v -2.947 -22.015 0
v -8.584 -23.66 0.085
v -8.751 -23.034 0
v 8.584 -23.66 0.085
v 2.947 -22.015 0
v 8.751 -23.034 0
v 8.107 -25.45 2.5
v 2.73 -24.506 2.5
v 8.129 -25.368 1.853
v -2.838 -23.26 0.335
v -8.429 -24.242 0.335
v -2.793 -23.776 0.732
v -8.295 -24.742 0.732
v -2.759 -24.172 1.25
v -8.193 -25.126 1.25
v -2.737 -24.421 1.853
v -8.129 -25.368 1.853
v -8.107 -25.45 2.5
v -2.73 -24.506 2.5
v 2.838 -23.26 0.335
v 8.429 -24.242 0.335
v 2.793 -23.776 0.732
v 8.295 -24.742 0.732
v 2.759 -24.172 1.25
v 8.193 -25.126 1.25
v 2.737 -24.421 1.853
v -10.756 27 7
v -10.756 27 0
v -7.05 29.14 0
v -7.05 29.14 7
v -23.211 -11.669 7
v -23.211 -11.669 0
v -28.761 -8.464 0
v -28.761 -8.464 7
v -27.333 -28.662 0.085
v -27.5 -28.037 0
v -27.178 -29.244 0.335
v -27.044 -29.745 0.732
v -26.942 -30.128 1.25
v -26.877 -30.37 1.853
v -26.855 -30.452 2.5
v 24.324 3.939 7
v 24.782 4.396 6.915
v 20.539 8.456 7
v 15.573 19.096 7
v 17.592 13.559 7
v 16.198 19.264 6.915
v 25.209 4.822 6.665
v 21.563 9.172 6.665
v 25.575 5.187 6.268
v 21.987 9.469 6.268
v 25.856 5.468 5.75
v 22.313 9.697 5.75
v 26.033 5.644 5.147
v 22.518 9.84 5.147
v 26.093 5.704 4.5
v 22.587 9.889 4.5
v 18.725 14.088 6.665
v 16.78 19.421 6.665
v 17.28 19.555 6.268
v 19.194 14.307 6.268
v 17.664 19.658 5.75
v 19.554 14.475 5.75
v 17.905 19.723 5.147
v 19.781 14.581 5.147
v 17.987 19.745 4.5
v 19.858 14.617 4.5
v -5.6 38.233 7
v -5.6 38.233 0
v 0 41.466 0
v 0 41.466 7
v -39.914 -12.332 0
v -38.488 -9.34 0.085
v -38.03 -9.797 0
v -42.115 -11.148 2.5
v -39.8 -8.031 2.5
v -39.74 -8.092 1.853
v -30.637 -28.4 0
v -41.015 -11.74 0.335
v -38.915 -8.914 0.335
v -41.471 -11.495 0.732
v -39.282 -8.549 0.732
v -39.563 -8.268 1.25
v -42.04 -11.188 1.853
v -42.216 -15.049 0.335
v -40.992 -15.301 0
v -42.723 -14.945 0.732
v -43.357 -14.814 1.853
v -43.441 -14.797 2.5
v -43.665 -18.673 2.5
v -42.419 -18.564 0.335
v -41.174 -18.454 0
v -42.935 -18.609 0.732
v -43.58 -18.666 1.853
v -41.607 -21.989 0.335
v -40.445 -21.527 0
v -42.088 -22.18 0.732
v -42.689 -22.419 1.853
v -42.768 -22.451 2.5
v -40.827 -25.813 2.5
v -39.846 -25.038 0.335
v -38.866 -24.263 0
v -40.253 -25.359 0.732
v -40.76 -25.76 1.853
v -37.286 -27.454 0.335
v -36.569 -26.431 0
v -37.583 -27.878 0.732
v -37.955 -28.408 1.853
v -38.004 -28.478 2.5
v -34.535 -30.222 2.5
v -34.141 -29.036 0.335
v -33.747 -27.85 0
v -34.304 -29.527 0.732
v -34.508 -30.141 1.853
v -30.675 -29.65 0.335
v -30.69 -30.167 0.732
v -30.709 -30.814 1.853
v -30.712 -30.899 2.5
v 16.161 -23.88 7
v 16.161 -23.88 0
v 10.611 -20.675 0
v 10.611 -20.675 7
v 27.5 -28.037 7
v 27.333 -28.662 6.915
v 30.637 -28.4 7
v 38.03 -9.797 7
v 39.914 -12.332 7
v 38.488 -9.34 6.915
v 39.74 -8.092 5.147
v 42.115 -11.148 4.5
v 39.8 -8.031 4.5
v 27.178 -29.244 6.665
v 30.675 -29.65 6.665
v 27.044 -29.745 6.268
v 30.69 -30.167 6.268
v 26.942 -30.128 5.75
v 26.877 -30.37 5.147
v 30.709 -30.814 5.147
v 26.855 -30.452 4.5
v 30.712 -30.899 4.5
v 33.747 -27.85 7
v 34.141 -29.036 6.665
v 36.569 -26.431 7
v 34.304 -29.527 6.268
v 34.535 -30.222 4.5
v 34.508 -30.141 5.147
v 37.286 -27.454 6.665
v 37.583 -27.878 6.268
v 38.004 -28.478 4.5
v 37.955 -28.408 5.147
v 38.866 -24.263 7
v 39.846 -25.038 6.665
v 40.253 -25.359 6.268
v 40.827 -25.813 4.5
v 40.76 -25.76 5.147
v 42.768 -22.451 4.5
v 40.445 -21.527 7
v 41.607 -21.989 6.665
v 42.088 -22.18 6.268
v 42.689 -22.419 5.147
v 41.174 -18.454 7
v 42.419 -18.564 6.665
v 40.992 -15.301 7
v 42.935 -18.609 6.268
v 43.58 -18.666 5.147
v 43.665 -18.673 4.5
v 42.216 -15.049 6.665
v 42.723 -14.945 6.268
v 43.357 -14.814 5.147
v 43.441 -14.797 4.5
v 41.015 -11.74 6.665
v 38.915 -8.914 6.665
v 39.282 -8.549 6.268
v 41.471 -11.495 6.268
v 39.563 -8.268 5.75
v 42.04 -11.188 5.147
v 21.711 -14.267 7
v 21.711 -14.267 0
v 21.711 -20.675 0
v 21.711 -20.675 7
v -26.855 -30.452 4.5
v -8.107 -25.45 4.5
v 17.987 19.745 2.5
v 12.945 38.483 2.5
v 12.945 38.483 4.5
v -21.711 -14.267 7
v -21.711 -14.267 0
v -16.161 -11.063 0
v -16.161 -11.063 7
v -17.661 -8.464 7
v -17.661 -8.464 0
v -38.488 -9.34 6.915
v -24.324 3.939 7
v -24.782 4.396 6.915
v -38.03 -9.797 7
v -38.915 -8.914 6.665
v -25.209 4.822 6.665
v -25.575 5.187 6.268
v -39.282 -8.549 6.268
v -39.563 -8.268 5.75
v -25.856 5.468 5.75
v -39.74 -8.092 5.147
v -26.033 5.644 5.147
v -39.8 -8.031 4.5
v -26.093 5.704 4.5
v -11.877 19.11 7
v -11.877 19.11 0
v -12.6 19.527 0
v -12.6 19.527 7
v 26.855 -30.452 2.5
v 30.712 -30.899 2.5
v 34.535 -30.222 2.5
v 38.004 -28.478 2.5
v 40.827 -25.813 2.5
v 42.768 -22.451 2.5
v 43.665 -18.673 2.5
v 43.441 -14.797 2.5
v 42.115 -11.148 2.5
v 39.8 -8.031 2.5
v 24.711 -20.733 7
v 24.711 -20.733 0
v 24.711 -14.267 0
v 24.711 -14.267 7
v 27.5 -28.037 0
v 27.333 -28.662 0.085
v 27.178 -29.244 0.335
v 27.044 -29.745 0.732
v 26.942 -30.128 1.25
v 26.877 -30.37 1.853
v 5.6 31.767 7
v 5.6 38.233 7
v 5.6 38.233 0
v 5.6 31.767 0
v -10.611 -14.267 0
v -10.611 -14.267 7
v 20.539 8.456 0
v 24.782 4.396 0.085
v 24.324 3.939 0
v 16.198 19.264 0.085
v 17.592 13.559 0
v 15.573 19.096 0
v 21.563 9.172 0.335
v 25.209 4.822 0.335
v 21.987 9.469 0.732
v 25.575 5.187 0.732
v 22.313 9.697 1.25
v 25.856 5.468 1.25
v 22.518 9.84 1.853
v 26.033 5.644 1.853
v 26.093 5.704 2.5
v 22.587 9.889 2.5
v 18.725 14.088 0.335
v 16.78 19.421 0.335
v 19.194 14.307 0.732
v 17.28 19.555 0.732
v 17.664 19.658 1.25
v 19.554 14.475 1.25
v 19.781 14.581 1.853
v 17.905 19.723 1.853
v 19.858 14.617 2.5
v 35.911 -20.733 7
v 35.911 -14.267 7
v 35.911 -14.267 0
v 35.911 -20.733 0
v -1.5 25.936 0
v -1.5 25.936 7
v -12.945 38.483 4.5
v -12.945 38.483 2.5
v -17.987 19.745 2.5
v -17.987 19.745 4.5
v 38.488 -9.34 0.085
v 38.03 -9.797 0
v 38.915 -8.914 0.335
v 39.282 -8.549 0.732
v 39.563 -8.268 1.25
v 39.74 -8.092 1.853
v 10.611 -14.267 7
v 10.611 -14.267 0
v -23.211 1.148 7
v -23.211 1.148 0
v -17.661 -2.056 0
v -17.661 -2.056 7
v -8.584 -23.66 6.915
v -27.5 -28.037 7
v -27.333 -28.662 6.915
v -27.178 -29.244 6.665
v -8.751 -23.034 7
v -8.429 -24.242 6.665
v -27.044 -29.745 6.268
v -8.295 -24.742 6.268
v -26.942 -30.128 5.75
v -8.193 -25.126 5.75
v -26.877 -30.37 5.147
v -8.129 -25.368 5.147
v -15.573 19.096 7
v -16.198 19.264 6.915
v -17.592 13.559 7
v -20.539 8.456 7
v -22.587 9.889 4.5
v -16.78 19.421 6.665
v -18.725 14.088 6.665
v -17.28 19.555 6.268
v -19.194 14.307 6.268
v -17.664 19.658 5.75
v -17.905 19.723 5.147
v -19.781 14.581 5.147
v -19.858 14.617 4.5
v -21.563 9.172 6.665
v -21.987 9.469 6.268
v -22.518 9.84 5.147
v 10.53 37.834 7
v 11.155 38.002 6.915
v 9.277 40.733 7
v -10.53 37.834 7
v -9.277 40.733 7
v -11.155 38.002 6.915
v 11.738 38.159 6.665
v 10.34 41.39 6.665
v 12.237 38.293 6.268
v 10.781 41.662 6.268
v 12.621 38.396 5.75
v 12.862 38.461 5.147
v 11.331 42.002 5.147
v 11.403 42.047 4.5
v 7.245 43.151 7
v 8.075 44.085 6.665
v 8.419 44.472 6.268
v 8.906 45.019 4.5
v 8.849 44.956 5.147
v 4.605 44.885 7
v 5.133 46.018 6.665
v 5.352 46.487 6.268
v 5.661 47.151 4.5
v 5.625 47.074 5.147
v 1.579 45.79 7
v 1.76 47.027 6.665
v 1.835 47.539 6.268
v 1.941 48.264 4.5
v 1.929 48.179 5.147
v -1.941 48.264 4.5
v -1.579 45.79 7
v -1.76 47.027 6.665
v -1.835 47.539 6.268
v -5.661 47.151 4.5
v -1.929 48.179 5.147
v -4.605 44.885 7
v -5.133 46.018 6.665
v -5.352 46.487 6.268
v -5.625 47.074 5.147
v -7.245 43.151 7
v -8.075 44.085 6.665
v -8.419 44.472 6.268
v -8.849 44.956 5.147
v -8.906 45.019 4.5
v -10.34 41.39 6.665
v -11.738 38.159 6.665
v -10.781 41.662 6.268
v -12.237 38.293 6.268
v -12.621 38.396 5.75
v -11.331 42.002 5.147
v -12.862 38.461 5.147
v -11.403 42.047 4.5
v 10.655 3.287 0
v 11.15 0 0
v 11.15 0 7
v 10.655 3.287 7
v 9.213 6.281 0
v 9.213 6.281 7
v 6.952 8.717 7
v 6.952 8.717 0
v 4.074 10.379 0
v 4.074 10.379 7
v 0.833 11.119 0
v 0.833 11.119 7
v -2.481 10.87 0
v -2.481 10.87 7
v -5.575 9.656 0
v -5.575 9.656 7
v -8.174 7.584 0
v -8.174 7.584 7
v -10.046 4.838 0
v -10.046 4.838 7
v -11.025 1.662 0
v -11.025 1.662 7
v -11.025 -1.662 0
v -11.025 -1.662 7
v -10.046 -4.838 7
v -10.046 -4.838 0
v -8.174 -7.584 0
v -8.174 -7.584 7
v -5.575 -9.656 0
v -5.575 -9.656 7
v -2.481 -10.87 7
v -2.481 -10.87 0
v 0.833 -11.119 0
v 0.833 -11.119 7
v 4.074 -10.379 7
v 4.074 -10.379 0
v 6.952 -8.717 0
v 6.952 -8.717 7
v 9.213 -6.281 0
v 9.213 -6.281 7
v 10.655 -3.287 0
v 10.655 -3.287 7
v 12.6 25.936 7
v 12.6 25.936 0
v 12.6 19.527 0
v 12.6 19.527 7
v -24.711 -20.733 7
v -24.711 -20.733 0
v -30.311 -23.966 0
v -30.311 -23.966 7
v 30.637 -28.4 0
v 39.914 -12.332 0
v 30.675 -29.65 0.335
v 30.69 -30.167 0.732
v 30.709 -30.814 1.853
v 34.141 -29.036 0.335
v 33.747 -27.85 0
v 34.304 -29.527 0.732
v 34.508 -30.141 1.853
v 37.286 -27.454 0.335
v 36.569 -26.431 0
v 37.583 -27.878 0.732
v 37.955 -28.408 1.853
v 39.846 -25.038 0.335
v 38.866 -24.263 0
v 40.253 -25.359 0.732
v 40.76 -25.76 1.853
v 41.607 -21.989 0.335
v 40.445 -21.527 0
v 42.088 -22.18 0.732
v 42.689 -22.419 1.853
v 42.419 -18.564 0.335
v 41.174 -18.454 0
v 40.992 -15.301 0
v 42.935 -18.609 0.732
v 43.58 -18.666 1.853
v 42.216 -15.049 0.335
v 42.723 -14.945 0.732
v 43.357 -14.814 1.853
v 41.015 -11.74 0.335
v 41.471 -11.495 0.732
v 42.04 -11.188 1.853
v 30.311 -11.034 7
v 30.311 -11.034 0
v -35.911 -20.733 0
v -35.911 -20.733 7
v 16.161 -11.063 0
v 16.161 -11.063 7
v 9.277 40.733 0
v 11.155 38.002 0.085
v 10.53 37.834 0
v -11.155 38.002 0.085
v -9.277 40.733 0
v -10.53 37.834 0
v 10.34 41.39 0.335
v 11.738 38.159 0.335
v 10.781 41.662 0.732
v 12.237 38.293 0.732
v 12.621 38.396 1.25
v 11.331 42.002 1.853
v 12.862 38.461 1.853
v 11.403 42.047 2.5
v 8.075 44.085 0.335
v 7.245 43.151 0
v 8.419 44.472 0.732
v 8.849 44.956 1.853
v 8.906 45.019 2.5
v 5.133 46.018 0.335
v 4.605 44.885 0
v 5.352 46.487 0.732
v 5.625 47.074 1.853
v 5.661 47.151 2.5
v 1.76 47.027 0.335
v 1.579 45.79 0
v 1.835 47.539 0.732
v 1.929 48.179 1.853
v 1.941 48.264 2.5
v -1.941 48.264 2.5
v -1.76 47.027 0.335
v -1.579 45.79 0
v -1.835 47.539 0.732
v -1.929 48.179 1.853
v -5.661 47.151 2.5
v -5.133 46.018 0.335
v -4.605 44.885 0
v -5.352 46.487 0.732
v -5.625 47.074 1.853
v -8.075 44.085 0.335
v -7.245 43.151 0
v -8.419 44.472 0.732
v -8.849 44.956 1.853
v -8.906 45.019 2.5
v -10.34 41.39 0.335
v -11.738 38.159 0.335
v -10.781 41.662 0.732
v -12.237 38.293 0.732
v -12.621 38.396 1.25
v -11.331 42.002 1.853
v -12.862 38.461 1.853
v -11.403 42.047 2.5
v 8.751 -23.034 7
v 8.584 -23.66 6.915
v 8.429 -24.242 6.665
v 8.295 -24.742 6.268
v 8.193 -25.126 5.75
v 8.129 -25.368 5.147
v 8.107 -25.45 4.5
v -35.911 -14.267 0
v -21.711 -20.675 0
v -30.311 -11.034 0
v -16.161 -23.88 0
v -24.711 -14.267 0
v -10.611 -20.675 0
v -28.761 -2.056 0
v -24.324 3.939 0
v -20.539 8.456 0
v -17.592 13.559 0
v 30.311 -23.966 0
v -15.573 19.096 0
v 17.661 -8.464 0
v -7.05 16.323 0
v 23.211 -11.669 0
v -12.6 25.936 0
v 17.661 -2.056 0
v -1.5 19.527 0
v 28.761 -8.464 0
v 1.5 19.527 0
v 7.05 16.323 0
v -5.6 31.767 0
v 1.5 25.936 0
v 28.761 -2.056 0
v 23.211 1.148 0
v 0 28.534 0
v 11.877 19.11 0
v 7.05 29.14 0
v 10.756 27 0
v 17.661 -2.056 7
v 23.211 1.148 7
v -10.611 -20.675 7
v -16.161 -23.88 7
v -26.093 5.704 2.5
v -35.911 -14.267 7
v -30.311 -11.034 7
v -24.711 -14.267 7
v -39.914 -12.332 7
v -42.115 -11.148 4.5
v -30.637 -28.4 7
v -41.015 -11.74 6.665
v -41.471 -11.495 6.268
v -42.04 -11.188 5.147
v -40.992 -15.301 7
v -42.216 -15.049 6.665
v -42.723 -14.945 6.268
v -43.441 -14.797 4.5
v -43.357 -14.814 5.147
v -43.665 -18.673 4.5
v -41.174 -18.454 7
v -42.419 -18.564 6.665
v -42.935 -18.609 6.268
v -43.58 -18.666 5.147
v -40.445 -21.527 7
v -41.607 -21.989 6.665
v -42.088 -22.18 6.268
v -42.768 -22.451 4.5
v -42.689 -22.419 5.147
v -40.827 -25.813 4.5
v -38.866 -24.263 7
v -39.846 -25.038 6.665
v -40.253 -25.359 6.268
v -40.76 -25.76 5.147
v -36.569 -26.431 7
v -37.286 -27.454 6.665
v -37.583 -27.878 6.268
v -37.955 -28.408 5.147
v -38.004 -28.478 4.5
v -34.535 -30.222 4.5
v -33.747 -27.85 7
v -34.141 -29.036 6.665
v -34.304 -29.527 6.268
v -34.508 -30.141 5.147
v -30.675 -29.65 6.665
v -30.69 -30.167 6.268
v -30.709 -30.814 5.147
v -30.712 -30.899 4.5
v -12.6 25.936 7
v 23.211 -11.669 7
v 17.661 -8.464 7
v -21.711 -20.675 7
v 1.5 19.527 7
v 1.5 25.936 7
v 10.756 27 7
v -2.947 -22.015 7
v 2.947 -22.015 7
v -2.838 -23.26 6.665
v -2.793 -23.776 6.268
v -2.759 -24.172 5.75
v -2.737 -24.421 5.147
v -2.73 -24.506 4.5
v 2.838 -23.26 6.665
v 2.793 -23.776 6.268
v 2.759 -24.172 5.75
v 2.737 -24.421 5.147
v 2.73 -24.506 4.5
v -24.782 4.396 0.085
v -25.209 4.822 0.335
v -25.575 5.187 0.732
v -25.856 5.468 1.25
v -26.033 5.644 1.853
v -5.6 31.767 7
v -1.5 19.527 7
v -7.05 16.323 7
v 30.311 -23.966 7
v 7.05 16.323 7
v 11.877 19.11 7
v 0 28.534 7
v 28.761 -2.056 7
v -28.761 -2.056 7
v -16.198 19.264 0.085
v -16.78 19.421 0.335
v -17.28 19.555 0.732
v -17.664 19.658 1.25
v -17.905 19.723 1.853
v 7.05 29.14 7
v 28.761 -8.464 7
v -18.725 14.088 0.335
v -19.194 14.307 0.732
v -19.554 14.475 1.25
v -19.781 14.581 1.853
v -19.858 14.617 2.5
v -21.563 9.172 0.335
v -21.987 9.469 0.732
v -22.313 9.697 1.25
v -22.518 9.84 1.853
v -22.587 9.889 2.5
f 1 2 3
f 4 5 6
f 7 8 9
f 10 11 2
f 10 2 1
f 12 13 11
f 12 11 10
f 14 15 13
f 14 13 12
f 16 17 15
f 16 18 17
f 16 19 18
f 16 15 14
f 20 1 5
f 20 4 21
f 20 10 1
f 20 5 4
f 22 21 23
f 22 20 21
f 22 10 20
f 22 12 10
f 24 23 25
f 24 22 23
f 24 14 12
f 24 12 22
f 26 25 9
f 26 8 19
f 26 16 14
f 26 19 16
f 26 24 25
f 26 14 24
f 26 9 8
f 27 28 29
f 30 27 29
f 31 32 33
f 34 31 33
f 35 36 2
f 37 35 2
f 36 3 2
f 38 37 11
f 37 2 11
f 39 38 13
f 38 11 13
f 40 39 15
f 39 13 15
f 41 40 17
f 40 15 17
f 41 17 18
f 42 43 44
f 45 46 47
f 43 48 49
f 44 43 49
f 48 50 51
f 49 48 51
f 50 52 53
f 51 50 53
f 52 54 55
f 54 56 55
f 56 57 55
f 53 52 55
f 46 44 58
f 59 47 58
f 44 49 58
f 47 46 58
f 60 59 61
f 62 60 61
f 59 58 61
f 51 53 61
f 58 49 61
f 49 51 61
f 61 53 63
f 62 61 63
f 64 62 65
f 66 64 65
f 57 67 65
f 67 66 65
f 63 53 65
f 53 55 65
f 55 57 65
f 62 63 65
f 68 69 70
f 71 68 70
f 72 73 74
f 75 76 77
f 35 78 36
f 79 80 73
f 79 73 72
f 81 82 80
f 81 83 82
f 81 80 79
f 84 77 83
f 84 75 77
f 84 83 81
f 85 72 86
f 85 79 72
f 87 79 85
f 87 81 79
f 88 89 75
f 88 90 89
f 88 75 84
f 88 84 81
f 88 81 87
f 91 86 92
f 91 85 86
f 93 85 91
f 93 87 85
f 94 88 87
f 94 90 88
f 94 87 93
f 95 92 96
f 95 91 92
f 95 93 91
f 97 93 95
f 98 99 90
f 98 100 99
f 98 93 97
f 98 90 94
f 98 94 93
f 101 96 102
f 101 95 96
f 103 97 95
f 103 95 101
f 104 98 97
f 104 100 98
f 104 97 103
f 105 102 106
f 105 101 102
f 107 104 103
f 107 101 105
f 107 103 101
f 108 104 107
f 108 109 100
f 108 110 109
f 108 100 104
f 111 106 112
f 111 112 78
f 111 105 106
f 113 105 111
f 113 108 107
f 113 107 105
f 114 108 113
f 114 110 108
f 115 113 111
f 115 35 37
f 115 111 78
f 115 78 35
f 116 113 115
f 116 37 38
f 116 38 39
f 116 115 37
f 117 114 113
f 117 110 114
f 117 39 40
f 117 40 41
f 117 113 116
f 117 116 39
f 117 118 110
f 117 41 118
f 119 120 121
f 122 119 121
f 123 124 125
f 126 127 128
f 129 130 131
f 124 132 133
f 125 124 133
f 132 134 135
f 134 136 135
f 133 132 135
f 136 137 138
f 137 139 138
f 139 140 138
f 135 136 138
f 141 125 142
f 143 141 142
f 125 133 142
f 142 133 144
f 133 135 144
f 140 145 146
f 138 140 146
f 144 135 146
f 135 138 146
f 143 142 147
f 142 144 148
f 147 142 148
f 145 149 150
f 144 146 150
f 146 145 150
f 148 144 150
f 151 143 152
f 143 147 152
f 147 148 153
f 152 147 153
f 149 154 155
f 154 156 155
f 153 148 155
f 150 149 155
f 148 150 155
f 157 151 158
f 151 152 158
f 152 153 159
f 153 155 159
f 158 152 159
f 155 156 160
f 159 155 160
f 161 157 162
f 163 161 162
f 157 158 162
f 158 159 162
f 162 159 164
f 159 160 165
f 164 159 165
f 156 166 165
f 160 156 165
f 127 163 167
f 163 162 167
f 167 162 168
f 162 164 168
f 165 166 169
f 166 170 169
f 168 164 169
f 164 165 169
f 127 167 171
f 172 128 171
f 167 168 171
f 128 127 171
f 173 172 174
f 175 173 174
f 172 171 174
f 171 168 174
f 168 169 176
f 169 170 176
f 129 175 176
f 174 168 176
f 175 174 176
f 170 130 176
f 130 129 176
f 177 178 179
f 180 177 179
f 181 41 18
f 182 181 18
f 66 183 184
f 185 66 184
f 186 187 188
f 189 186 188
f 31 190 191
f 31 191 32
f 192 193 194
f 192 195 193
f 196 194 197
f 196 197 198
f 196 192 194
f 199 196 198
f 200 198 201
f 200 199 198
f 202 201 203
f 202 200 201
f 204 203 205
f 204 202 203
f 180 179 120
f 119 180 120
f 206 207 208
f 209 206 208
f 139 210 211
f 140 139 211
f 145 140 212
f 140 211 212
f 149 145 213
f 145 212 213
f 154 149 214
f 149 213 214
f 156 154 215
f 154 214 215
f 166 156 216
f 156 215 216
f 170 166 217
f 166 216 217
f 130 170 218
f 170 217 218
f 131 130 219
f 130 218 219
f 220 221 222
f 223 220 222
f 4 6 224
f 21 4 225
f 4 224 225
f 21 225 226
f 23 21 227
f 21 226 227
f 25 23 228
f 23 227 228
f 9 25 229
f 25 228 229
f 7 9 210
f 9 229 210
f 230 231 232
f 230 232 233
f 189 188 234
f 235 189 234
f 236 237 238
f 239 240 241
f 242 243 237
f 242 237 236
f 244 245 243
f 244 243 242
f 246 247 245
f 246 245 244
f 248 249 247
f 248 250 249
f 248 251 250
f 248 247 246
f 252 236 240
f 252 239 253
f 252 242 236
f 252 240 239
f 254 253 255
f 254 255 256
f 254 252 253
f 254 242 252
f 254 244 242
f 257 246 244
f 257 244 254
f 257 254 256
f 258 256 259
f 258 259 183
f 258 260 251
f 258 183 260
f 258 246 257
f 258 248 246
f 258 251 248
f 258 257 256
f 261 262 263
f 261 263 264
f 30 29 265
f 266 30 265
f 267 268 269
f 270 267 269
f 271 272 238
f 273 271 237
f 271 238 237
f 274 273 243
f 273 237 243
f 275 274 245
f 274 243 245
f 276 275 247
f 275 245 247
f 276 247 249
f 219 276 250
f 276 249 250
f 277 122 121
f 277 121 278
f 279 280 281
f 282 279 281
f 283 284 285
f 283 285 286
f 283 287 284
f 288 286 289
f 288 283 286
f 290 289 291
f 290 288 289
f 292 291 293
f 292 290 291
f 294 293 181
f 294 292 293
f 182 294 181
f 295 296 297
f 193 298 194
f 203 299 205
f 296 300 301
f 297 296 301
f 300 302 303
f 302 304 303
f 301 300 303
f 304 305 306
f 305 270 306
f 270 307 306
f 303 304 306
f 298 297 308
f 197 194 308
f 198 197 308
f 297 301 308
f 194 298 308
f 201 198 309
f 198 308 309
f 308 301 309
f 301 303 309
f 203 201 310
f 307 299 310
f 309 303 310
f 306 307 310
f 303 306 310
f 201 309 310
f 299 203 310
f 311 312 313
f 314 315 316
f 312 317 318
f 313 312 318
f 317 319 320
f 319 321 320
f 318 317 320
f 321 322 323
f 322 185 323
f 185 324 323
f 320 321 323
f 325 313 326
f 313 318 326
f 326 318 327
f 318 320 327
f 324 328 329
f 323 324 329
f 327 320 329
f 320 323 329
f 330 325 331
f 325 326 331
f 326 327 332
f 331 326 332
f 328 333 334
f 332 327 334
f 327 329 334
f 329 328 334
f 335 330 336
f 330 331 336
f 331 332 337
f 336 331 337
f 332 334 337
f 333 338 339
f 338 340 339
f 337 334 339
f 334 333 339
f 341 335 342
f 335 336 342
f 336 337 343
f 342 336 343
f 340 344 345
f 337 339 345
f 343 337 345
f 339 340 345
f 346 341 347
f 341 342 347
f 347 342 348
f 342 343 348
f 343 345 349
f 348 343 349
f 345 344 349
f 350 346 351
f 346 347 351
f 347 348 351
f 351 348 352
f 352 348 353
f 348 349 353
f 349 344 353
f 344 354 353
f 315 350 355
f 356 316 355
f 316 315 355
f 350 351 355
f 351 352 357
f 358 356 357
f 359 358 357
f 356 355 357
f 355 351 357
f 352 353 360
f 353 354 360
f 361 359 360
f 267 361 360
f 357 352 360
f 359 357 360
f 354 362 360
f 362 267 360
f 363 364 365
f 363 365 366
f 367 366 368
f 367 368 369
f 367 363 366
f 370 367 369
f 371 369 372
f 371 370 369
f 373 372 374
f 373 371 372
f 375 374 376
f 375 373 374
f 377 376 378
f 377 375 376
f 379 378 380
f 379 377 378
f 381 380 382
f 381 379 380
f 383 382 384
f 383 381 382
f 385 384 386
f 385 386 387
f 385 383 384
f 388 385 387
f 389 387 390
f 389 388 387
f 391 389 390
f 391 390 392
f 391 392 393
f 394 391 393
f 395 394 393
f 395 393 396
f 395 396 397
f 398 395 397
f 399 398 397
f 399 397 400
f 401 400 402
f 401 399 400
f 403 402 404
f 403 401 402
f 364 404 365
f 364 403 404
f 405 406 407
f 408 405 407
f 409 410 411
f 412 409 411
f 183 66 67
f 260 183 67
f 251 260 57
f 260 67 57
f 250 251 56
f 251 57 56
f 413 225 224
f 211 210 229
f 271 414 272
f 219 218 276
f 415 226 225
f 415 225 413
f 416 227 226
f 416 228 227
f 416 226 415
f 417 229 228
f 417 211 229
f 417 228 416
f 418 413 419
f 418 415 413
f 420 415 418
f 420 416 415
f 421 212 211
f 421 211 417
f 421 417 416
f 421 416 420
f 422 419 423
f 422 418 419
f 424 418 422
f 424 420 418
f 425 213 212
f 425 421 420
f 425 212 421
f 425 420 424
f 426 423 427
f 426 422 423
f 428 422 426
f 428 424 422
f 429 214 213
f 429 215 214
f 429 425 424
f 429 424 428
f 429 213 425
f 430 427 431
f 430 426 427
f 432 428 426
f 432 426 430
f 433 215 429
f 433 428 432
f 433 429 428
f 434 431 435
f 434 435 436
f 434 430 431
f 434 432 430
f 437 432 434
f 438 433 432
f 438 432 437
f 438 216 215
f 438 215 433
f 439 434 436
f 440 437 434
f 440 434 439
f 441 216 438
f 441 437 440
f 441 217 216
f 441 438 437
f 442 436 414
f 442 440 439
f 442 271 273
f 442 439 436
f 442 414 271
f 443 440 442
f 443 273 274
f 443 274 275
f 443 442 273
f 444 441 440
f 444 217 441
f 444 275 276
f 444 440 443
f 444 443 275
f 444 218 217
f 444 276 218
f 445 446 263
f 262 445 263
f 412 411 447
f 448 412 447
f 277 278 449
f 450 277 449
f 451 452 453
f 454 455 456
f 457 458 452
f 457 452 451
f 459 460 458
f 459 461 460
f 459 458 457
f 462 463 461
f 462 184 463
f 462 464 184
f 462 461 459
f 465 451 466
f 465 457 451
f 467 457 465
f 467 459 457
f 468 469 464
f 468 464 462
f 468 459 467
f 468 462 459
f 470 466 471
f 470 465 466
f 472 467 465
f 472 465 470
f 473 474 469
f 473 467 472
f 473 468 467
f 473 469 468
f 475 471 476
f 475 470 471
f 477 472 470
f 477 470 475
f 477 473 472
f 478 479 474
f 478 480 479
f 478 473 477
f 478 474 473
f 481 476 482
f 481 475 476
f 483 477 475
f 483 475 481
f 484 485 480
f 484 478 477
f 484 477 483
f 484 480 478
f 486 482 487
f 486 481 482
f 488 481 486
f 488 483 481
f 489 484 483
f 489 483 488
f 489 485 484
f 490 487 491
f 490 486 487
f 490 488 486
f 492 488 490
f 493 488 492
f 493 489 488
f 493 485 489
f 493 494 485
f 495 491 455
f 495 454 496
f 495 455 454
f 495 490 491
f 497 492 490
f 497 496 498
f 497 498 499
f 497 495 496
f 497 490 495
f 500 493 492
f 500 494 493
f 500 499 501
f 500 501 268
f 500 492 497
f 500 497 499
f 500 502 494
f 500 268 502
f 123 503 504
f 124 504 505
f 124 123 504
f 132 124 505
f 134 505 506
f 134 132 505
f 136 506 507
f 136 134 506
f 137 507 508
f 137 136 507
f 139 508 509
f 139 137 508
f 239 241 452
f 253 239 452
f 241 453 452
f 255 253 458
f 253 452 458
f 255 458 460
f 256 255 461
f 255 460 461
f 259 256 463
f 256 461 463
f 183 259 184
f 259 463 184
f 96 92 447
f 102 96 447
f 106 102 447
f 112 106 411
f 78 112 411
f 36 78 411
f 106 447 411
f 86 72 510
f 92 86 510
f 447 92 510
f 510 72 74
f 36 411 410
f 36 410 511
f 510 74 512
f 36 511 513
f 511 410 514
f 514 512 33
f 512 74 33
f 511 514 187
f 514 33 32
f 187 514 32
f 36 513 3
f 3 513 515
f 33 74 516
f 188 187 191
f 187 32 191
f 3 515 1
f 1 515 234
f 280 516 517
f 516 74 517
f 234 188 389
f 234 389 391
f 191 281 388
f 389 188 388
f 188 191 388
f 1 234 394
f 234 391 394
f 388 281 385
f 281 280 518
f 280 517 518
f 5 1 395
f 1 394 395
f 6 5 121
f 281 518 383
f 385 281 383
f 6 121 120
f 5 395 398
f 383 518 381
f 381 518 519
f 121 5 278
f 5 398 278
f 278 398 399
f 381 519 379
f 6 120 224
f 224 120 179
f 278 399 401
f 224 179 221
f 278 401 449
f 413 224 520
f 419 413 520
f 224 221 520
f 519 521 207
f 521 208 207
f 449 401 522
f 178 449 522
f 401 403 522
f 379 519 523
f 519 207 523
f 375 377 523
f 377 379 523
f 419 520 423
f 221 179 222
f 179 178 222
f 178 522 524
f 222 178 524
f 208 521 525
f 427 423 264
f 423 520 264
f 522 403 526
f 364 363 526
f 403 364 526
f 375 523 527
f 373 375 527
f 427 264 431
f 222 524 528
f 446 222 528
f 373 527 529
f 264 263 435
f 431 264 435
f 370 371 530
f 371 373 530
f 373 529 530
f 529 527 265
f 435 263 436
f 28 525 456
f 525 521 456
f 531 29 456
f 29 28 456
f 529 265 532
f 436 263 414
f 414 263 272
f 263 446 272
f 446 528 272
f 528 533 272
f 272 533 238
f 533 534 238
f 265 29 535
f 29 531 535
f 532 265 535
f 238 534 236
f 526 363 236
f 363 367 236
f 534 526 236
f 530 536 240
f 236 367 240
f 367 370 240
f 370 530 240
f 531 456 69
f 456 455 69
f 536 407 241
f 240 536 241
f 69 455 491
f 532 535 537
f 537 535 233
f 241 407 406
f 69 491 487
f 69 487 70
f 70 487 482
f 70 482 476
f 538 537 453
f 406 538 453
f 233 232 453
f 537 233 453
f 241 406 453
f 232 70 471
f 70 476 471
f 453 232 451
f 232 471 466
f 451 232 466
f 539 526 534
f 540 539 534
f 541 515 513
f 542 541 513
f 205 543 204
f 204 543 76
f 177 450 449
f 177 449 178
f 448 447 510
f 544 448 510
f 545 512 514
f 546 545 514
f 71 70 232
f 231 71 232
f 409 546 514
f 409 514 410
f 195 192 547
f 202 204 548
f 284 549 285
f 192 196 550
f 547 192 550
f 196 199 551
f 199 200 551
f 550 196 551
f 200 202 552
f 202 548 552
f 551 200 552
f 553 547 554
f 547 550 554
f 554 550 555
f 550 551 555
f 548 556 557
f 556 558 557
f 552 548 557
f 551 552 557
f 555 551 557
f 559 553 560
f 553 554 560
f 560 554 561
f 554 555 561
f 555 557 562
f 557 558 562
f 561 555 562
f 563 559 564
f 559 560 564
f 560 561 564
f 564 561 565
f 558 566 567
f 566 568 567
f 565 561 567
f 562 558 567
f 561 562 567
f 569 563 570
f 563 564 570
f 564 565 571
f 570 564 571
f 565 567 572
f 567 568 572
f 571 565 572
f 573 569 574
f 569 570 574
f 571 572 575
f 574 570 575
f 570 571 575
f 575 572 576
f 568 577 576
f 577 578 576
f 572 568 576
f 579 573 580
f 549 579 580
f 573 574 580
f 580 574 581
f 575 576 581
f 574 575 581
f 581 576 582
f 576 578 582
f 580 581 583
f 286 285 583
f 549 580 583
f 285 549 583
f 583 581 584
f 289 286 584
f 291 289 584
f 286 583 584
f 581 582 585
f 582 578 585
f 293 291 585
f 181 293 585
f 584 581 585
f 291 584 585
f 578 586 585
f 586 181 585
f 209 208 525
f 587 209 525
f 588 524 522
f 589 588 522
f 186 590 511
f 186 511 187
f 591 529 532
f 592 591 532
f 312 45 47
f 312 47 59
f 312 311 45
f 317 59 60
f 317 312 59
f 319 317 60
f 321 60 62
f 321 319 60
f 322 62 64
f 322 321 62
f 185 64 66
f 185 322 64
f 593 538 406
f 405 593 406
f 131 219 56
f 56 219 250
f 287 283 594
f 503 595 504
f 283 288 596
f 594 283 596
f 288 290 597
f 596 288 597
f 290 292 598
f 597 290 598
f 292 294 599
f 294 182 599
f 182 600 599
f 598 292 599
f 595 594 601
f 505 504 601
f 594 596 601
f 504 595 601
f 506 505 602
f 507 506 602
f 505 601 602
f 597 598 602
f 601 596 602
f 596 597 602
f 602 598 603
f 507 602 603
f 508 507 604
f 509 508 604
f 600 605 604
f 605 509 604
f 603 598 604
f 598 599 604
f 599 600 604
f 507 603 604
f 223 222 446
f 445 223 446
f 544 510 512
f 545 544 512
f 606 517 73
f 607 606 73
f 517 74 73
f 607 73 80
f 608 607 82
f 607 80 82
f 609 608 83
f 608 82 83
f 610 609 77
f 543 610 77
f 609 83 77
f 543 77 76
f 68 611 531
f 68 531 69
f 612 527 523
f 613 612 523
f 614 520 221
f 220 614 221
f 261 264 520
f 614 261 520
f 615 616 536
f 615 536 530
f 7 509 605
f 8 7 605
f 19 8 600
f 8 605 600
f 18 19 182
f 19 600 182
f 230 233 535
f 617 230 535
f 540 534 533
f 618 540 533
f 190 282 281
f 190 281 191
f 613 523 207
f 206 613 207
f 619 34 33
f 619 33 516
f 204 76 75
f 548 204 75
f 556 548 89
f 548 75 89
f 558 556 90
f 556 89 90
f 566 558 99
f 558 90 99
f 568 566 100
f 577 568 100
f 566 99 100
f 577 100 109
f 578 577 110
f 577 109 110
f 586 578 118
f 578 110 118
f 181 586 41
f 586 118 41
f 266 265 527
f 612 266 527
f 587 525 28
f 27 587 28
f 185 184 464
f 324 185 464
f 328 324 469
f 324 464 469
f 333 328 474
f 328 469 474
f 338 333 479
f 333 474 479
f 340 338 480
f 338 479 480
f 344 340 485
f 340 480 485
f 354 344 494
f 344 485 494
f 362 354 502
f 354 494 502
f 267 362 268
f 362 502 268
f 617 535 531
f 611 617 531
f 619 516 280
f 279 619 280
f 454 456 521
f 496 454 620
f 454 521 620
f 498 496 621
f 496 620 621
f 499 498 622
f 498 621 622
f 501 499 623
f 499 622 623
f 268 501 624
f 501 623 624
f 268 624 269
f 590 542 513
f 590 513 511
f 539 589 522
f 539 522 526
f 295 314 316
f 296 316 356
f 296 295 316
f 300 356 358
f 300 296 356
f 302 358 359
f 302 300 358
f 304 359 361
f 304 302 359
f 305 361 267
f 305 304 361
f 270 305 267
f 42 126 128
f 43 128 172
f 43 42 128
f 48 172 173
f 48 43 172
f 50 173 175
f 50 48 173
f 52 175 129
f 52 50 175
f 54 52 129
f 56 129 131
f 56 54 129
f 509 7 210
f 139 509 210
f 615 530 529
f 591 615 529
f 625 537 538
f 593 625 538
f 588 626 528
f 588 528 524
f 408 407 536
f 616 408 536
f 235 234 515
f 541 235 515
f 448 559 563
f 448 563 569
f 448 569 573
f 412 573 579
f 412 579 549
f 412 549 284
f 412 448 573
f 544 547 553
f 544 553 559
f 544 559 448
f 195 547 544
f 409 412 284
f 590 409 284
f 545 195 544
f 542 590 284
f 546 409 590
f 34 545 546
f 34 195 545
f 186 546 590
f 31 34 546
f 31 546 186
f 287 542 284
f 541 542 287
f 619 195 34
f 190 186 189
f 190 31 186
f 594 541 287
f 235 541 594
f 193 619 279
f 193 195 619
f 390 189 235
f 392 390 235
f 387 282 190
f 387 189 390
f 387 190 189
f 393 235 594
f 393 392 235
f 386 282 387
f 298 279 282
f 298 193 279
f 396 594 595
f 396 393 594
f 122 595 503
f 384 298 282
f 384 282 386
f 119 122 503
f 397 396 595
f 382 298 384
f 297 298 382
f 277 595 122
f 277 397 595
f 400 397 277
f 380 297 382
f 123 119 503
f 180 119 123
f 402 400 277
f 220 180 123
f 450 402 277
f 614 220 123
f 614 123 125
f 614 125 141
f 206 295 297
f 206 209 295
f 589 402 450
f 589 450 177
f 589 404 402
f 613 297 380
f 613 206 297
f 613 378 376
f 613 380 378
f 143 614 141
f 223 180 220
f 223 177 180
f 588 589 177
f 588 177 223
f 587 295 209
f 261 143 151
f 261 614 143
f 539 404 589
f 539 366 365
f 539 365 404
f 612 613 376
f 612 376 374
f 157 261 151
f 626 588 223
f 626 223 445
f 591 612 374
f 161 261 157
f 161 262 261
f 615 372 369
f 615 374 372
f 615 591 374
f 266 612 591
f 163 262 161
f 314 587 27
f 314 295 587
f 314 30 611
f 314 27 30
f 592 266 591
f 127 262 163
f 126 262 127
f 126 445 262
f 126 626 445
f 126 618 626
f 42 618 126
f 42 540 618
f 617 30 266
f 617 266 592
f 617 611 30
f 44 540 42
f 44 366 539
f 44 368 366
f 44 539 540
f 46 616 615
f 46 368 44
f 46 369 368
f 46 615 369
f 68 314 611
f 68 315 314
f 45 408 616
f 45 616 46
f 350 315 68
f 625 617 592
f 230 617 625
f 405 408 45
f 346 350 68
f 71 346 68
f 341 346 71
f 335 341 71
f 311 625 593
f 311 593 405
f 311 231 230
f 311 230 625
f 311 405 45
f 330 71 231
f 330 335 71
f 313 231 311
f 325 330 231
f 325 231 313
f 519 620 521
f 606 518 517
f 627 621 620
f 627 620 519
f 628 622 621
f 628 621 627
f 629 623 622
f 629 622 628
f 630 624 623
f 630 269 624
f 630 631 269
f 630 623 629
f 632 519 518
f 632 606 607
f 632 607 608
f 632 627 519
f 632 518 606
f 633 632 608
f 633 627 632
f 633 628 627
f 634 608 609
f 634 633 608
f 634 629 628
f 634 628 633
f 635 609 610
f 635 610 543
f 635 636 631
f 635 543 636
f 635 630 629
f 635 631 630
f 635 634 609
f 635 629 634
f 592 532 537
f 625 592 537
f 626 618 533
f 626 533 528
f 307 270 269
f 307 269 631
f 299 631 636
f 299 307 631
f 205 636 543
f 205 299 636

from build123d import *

# Parameters (mm, degrees)
F0_R     = 11.15
F1_DEPTH = 7
F2_R     = 31.4472101729
F3_R     = 2.5


with BuildPart() as f1:
    # F0 (on Top) → F1 (new body)
    with BuildSketch(Plane.XY):
        with BuildLine():
            Line((20.1671623726, 11.6435166246), (12.9445725954, 38.4833765179))
            ThreePointArc((12.9445725954, 38.4833765179), (0, 48.4050688787), (-12.9445725954, 38.4833765179))
            Line((-12.9445725954, 38.4833765179), (-20.1671623726, 11.6435166246))
            Line((-20.1671623726, 11.6435166246), (-39.7998679856, -8.0313595503))
            ThreePointArc((-39.7998679856, -8.0313595503), (-41.9200193209, -24.2025344393), (-26.8552953903, -30.4520169677))
            Line((-26.8552953903, -30.4520169677), (0, -23.2870332492))
            Line((0, -23.2870332492), (26.8552953903, -30.4520169677))
            ThreePointArc((26.8552953903, -30.4520169677), (41.9200193209, -24.2025344393), (39.7998679856, -8.0313595503))
            Line((39.7998679856, -8.0313595503), (20.1671623726, 11.6435166246))
        make_face()
        Polygon((-35.9108891325, -14.2668384925), (-30.3108891325, -11.0336769851), (-24.7108891325, -14.2668384925), (-24.7108891325, -20.7331615075), (-30.3108891325, -23.9663230149), (-35.9108891325, -20.7331615075), align=None, mode=Mode.SUBTRACT)
        Polygon((-16.1608891325, -23.8797204745), (-21.7108891325, -20.6754264805), (-21.7108891325, -14.2668384925), (-16.1608891325, -11.0625444985), (-10.6108891325, -14.2668384925), (-10.6108891325, -20.6754264805), align=None, mode=Mode.SUBTRACT)
        Polygon((-23.2108891325, 1.1484136948), (-17.6608891325, -2.0558802992), (-17.6608891325, -8.4644682872), (-23.2108891325, -11.6687622812), (-28.7608891325, -8.4644682872), (-28.7608891325, -2.0558802992), align=None, mode=Mode.SUBTRACT)
        Polygon((10.6108891325, -20.6754264805), (10.6108891325, -14.2668384925), (16.1608891325, -11.0625444985), (21.7108891325, -14.2668384925), (21.7108891325, -20.6754264805), (16.1608891325, -23.8797204745), align=None, mode=Mode.SUBTRACT)
        Polygon((30.3108891325, -23.9663230149), (24.7108891325, -20.7331615075), (24.7108891325, -14.2668384925), (30.3108891325, -11.0336769851), (35.9108891325, -14.2668384925), (35.9108891325, -20.7331615075), align=None, mode=Mode.SUBTRACT)
        Circle(F0_R, mode=Mode.SUBTRACT)
        Polygon((28.7608891325, -2.0558802992), (28.7608891325, -8.4644682872), (23.2108891325, -11.6687622812), (17.6608891325, -8.4644682872), (17.6608891325, -2.0558802992), (23.2108891325, 1.1484136948), align=None, mode=Mode.SUBTRACT)
        Polygon((-7.05, 29.1398947677), (-1.5, 25.9356007737), (-1.5, 21.6791189615), (-1.5, 19.5270127857), (-7.05, 16.3227187917), (-11.8772290867, 19.1097208044), (-12.6, 19.5270127857), (-12.6, 25.9356007737), (-10.7562631022, 27.000082768), align=None, mode=Mode.SUBTRACT)
        Polygon((10.7562631022, 27.000082768), (12.6, 25.9356007737), (12.6, 19.5270127857), (11.8772290867, 19.1097208044), (7.05, 16.3227187917), (1.5, 19.5270127857), (1.5, 21.6791189615), (1.5, 25.9356007737), (7.05, 29.1398947677), align=None, mode=Mode.SUBTRACT)
        Polygon((0, 41.4663230149), (5.6, 38.2331615075), (5.6, 31.7668384925), (0, 28.5336769851), (-5.6, 31.7668384925), (-5.6, 38.2331615075), align=None, mode=Mode.SUBTRACT)
    extrude(amount=F1_DEPTH)

    # F2
    f2_edges = [f1.edges().sort_by_distance(p)[0] for p in [
        (20.167162, 11.643517, 3.5),
        (-20.167162, 11.643517, 3.5),
        (0, -23.287033, 3.5),
    ]]
    fillet(f2_edges, radius=F2_R)

    # F3
    f3_edges = [f1.edges().sort_by_distance(p)[0] for p in [
        (-32.946681, -1.163452, 7),
        (-21.11979, 12.193517, 0),
    ]]
    fillet(f3_edges, radius=F3_R)


solid = f1.part
